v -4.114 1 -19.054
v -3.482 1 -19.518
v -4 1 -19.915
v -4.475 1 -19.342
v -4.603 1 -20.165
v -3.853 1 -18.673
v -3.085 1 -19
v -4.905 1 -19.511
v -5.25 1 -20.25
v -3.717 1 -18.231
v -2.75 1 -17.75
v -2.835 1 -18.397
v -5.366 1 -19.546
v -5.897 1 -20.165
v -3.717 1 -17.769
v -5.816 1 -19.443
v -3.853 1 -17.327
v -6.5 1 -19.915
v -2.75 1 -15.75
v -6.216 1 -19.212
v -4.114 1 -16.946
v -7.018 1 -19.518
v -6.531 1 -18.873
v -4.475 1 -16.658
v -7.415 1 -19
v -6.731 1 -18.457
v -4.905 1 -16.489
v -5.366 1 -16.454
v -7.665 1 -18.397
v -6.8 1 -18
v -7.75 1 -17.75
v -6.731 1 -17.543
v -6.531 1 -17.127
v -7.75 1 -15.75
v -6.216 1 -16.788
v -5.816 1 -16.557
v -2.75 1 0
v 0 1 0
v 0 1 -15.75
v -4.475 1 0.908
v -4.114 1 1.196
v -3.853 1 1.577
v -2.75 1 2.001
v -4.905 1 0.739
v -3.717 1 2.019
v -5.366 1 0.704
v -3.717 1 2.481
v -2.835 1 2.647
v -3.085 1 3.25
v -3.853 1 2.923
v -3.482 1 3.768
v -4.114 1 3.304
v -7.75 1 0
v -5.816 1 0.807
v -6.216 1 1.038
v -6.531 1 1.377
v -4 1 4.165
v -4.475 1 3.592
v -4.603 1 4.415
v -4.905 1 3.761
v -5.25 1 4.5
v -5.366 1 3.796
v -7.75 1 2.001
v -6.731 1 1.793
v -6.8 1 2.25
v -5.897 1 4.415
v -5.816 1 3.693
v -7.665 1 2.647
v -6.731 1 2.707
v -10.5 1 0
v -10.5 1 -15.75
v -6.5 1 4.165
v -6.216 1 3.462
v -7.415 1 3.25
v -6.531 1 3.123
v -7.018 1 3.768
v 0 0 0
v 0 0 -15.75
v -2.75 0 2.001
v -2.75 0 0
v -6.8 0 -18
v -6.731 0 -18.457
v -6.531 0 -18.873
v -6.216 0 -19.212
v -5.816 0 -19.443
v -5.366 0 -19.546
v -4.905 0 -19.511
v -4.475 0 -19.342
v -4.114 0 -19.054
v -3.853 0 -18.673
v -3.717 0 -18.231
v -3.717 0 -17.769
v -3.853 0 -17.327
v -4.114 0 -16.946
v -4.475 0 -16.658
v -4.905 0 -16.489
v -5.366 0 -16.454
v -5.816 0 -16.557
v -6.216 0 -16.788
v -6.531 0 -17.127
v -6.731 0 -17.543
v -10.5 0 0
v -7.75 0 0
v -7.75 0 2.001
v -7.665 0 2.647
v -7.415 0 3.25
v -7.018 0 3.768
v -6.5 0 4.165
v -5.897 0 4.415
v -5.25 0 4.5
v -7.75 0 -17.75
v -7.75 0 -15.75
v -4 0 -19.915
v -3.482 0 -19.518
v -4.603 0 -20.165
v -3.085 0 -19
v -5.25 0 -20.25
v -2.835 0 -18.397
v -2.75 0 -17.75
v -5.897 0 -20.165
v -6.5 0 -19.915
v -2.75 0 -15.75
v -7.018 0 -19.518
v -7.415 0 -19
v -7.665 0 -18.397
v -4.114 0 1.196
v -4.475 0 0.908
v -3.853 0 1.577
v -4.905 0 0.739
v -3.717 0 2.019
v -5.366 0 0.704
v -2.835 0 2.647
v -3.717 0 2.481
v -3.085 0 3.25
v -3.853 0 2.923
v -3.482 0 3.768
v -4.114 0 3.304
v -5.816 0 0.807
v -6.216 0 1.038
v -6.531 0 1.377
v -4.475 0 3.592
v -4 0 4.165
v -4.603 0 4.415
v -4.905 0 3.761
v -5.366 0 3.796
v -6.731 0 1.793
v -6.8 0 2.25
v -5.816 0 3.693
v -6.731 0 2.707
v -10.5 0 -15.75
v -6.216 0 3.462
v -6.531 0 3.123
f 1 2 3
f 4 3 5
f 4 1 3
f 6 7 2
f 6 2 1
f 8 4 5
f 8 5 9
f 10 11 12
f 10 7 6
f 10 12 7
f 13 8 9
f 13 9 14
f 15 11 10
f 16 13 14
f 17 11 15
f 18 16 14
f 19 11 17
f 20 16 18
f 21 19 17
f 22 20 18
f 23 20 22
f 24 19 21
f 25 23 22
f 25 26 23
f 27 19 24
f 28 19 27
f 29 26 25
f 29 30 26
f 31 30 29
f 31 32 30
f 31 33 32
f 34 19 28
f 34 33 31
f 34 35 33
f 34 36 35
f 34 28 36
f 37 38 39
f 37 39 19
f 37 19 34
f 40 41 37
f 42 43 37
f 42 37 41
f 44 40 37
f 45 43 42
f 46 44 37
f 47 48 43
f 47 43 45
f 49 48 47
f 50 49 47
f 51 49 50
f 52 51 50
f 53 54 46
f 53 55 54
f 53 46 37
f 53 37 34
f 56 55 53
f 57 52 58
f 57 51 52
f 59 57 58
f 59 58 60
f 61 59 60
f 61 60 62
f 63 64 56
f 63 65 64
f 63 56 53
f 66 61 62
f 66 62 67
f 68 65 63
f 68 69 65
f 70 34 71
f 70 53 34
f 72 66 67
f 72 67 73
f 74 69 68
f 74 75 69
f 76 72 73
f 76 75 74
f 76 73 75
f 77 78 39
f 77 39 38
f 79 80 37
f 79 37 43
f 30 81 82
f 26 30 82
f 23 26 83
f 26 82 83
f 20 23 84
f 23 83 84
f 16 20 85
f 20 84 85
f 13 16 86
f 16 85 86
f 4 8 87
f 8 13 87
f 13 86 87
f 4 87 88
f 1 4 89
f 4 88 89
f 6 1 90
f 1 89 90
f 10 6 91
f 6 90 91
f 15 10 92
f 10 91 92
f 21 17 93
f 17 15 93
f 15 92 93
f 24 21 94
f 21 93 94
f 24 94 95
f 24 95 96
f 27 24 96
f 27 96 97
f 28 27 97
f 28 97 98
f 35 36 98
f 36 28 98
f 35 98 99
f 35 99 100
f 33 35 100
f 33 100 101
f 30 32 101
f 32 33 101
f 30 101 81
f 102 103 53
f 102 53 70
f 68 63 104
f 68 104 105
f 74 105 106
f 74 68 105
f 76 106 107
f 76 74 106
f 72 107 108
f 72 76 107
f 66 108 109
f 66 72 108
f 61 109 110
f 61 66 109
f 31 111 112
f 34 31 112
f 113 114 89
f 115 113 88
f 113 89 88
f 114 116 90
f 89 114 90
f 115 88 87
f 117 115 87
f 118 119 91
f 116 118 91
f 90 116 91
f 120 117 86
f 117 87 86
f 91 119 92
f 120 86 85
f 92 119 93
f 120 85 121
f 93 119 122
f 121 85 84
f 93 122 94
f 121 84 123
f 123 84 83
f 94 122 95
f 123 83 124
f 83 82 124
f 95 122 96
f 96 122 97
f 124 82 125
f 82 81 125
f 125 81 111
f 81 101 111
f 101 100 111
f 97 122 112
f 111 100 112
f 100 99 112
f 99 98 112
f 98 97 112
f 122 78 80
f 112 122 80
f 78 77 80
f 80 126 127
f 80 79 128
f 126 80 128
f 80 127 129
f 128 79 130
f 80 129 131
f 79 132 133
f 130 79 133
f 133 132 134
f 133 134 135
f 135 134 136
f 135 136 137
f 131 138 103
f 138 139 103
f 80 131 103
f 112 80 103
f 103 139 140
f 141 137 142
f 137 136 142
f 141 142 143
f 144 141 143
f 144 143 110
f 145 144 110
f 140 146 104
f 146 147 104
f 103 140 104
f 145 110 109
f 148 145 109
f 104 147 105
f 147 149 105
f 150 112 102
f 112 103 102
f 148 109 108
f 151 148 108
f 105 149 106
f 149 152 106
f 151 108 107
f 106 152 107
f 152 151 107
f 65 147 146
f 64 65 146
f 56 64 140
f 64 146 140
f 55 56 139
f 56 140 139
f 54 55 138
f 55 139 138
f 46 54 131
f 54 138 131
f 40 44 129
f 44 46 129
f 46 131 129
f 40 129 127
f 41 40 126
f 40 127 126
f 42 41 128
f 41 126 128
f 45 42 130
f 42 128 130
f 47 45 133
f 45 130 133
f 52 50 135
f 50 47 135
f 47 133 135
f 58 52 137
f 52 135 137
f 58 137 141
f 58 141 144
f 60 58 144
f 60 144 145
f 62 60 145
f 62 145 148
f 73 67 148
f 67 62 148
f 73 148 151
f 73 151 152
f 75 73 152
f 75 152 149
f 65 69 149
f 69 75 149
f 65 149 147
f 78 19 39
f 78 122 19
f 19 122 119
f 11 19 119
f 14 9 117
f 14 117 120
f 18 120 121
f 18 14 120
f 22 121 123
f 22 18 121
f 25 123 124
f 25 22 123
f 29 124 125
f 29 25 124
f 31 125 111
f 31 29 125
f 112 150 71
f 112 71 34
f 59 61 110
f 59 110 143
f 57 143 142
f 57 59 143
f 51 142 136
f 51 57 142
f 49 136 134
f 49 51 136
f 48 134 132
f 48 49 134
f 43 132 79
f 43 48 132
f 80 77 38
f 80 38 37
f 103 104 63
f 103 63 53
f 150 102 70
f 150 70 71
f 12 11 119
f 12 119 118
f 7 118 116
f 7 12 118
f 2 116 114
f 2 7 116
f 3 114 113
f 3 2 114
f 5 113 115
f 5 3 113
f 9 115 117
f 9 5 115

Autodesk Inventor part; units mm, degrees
ref_plane "YZ Plane" through (0, 0, 0) normal (1, 0, 0) x (0, 1, 0)
ref_plane "XZ Plane" through (0, 0, 0) normal (0, 1, 0) x (-1, 0, 0)
ref_plane "XY Plane" through (0, 0, 0) normal (0, 0, 1) x (1, 0, 0)
sketch "Szkic1" plane through (0, 0, 0) normal (0, 1, 0) x (-1, 0, 0)
  line L0 (0, 0) -> (10.5, 0)
  line L1 (10.5, 0) -> (10.5, -15.75)
  line L2 (10.5, -15.75) -> (0, -15.75)
  line L3 (0, -15.75) -> (0, 0)
  line L4 (7.75, -15.75) -> (2.75, -15.75)
  line L5 (2.75, -15.75) -> (2.75, -20.25)
  line L6 (2.75, -20.25) -> (7.75, -20.25)
  line L7 (7.75, -20.25) -> (7.75, -15.75)
  line L8 (7.75, 0) -> (2.75, 0)
  line L9 (2.75, 0) -> (2.75, 4.5)
  line L10 (2.75, 4.5) -> (7.75, 4.5)
  line L11 (7.75, 4.5) -> (7.75, 0)
  circle A0 centre (5.25, 2.25) radius 1.55
  circle A1 centre (5.25, -18) radius 1.55
  point P0 (5.25, -20.25)
  point P1 (7.75, -18)
  point P2 (5.25, 4.5)
  point P3 (7.75, 2.25)
  dimension "d0" = 10.5
  dimension "d1" = 15.75
  dimension "d2" = 5
  dimension "d3" = 4.5
  dimension "d4" = 2.75
  dimension "d5" = 5
  dimension "d6" = 4.5
  dimension "d7" = 2.75
  dimension "d8" = 3.1
  dimension "d9" = 3.1
  dimension "d10" = 2.25
  dimension "d11" = 2.5
  dimension "d12" = 2.25
  dimension "d13" = 2.5
extrude "Wyciągnięcie proste1" add sketch "Szkic1" along normal blind 1
fillet "Zaokrąglenie1" radius 2.5 4 edges at (-2.75, 0.5, 4.5) (-7.75, 0.5, 4.5) (-2.75, 0.5, -20.25) (-7.75, 0.5, -20.25)
properties part number "1XV2"
